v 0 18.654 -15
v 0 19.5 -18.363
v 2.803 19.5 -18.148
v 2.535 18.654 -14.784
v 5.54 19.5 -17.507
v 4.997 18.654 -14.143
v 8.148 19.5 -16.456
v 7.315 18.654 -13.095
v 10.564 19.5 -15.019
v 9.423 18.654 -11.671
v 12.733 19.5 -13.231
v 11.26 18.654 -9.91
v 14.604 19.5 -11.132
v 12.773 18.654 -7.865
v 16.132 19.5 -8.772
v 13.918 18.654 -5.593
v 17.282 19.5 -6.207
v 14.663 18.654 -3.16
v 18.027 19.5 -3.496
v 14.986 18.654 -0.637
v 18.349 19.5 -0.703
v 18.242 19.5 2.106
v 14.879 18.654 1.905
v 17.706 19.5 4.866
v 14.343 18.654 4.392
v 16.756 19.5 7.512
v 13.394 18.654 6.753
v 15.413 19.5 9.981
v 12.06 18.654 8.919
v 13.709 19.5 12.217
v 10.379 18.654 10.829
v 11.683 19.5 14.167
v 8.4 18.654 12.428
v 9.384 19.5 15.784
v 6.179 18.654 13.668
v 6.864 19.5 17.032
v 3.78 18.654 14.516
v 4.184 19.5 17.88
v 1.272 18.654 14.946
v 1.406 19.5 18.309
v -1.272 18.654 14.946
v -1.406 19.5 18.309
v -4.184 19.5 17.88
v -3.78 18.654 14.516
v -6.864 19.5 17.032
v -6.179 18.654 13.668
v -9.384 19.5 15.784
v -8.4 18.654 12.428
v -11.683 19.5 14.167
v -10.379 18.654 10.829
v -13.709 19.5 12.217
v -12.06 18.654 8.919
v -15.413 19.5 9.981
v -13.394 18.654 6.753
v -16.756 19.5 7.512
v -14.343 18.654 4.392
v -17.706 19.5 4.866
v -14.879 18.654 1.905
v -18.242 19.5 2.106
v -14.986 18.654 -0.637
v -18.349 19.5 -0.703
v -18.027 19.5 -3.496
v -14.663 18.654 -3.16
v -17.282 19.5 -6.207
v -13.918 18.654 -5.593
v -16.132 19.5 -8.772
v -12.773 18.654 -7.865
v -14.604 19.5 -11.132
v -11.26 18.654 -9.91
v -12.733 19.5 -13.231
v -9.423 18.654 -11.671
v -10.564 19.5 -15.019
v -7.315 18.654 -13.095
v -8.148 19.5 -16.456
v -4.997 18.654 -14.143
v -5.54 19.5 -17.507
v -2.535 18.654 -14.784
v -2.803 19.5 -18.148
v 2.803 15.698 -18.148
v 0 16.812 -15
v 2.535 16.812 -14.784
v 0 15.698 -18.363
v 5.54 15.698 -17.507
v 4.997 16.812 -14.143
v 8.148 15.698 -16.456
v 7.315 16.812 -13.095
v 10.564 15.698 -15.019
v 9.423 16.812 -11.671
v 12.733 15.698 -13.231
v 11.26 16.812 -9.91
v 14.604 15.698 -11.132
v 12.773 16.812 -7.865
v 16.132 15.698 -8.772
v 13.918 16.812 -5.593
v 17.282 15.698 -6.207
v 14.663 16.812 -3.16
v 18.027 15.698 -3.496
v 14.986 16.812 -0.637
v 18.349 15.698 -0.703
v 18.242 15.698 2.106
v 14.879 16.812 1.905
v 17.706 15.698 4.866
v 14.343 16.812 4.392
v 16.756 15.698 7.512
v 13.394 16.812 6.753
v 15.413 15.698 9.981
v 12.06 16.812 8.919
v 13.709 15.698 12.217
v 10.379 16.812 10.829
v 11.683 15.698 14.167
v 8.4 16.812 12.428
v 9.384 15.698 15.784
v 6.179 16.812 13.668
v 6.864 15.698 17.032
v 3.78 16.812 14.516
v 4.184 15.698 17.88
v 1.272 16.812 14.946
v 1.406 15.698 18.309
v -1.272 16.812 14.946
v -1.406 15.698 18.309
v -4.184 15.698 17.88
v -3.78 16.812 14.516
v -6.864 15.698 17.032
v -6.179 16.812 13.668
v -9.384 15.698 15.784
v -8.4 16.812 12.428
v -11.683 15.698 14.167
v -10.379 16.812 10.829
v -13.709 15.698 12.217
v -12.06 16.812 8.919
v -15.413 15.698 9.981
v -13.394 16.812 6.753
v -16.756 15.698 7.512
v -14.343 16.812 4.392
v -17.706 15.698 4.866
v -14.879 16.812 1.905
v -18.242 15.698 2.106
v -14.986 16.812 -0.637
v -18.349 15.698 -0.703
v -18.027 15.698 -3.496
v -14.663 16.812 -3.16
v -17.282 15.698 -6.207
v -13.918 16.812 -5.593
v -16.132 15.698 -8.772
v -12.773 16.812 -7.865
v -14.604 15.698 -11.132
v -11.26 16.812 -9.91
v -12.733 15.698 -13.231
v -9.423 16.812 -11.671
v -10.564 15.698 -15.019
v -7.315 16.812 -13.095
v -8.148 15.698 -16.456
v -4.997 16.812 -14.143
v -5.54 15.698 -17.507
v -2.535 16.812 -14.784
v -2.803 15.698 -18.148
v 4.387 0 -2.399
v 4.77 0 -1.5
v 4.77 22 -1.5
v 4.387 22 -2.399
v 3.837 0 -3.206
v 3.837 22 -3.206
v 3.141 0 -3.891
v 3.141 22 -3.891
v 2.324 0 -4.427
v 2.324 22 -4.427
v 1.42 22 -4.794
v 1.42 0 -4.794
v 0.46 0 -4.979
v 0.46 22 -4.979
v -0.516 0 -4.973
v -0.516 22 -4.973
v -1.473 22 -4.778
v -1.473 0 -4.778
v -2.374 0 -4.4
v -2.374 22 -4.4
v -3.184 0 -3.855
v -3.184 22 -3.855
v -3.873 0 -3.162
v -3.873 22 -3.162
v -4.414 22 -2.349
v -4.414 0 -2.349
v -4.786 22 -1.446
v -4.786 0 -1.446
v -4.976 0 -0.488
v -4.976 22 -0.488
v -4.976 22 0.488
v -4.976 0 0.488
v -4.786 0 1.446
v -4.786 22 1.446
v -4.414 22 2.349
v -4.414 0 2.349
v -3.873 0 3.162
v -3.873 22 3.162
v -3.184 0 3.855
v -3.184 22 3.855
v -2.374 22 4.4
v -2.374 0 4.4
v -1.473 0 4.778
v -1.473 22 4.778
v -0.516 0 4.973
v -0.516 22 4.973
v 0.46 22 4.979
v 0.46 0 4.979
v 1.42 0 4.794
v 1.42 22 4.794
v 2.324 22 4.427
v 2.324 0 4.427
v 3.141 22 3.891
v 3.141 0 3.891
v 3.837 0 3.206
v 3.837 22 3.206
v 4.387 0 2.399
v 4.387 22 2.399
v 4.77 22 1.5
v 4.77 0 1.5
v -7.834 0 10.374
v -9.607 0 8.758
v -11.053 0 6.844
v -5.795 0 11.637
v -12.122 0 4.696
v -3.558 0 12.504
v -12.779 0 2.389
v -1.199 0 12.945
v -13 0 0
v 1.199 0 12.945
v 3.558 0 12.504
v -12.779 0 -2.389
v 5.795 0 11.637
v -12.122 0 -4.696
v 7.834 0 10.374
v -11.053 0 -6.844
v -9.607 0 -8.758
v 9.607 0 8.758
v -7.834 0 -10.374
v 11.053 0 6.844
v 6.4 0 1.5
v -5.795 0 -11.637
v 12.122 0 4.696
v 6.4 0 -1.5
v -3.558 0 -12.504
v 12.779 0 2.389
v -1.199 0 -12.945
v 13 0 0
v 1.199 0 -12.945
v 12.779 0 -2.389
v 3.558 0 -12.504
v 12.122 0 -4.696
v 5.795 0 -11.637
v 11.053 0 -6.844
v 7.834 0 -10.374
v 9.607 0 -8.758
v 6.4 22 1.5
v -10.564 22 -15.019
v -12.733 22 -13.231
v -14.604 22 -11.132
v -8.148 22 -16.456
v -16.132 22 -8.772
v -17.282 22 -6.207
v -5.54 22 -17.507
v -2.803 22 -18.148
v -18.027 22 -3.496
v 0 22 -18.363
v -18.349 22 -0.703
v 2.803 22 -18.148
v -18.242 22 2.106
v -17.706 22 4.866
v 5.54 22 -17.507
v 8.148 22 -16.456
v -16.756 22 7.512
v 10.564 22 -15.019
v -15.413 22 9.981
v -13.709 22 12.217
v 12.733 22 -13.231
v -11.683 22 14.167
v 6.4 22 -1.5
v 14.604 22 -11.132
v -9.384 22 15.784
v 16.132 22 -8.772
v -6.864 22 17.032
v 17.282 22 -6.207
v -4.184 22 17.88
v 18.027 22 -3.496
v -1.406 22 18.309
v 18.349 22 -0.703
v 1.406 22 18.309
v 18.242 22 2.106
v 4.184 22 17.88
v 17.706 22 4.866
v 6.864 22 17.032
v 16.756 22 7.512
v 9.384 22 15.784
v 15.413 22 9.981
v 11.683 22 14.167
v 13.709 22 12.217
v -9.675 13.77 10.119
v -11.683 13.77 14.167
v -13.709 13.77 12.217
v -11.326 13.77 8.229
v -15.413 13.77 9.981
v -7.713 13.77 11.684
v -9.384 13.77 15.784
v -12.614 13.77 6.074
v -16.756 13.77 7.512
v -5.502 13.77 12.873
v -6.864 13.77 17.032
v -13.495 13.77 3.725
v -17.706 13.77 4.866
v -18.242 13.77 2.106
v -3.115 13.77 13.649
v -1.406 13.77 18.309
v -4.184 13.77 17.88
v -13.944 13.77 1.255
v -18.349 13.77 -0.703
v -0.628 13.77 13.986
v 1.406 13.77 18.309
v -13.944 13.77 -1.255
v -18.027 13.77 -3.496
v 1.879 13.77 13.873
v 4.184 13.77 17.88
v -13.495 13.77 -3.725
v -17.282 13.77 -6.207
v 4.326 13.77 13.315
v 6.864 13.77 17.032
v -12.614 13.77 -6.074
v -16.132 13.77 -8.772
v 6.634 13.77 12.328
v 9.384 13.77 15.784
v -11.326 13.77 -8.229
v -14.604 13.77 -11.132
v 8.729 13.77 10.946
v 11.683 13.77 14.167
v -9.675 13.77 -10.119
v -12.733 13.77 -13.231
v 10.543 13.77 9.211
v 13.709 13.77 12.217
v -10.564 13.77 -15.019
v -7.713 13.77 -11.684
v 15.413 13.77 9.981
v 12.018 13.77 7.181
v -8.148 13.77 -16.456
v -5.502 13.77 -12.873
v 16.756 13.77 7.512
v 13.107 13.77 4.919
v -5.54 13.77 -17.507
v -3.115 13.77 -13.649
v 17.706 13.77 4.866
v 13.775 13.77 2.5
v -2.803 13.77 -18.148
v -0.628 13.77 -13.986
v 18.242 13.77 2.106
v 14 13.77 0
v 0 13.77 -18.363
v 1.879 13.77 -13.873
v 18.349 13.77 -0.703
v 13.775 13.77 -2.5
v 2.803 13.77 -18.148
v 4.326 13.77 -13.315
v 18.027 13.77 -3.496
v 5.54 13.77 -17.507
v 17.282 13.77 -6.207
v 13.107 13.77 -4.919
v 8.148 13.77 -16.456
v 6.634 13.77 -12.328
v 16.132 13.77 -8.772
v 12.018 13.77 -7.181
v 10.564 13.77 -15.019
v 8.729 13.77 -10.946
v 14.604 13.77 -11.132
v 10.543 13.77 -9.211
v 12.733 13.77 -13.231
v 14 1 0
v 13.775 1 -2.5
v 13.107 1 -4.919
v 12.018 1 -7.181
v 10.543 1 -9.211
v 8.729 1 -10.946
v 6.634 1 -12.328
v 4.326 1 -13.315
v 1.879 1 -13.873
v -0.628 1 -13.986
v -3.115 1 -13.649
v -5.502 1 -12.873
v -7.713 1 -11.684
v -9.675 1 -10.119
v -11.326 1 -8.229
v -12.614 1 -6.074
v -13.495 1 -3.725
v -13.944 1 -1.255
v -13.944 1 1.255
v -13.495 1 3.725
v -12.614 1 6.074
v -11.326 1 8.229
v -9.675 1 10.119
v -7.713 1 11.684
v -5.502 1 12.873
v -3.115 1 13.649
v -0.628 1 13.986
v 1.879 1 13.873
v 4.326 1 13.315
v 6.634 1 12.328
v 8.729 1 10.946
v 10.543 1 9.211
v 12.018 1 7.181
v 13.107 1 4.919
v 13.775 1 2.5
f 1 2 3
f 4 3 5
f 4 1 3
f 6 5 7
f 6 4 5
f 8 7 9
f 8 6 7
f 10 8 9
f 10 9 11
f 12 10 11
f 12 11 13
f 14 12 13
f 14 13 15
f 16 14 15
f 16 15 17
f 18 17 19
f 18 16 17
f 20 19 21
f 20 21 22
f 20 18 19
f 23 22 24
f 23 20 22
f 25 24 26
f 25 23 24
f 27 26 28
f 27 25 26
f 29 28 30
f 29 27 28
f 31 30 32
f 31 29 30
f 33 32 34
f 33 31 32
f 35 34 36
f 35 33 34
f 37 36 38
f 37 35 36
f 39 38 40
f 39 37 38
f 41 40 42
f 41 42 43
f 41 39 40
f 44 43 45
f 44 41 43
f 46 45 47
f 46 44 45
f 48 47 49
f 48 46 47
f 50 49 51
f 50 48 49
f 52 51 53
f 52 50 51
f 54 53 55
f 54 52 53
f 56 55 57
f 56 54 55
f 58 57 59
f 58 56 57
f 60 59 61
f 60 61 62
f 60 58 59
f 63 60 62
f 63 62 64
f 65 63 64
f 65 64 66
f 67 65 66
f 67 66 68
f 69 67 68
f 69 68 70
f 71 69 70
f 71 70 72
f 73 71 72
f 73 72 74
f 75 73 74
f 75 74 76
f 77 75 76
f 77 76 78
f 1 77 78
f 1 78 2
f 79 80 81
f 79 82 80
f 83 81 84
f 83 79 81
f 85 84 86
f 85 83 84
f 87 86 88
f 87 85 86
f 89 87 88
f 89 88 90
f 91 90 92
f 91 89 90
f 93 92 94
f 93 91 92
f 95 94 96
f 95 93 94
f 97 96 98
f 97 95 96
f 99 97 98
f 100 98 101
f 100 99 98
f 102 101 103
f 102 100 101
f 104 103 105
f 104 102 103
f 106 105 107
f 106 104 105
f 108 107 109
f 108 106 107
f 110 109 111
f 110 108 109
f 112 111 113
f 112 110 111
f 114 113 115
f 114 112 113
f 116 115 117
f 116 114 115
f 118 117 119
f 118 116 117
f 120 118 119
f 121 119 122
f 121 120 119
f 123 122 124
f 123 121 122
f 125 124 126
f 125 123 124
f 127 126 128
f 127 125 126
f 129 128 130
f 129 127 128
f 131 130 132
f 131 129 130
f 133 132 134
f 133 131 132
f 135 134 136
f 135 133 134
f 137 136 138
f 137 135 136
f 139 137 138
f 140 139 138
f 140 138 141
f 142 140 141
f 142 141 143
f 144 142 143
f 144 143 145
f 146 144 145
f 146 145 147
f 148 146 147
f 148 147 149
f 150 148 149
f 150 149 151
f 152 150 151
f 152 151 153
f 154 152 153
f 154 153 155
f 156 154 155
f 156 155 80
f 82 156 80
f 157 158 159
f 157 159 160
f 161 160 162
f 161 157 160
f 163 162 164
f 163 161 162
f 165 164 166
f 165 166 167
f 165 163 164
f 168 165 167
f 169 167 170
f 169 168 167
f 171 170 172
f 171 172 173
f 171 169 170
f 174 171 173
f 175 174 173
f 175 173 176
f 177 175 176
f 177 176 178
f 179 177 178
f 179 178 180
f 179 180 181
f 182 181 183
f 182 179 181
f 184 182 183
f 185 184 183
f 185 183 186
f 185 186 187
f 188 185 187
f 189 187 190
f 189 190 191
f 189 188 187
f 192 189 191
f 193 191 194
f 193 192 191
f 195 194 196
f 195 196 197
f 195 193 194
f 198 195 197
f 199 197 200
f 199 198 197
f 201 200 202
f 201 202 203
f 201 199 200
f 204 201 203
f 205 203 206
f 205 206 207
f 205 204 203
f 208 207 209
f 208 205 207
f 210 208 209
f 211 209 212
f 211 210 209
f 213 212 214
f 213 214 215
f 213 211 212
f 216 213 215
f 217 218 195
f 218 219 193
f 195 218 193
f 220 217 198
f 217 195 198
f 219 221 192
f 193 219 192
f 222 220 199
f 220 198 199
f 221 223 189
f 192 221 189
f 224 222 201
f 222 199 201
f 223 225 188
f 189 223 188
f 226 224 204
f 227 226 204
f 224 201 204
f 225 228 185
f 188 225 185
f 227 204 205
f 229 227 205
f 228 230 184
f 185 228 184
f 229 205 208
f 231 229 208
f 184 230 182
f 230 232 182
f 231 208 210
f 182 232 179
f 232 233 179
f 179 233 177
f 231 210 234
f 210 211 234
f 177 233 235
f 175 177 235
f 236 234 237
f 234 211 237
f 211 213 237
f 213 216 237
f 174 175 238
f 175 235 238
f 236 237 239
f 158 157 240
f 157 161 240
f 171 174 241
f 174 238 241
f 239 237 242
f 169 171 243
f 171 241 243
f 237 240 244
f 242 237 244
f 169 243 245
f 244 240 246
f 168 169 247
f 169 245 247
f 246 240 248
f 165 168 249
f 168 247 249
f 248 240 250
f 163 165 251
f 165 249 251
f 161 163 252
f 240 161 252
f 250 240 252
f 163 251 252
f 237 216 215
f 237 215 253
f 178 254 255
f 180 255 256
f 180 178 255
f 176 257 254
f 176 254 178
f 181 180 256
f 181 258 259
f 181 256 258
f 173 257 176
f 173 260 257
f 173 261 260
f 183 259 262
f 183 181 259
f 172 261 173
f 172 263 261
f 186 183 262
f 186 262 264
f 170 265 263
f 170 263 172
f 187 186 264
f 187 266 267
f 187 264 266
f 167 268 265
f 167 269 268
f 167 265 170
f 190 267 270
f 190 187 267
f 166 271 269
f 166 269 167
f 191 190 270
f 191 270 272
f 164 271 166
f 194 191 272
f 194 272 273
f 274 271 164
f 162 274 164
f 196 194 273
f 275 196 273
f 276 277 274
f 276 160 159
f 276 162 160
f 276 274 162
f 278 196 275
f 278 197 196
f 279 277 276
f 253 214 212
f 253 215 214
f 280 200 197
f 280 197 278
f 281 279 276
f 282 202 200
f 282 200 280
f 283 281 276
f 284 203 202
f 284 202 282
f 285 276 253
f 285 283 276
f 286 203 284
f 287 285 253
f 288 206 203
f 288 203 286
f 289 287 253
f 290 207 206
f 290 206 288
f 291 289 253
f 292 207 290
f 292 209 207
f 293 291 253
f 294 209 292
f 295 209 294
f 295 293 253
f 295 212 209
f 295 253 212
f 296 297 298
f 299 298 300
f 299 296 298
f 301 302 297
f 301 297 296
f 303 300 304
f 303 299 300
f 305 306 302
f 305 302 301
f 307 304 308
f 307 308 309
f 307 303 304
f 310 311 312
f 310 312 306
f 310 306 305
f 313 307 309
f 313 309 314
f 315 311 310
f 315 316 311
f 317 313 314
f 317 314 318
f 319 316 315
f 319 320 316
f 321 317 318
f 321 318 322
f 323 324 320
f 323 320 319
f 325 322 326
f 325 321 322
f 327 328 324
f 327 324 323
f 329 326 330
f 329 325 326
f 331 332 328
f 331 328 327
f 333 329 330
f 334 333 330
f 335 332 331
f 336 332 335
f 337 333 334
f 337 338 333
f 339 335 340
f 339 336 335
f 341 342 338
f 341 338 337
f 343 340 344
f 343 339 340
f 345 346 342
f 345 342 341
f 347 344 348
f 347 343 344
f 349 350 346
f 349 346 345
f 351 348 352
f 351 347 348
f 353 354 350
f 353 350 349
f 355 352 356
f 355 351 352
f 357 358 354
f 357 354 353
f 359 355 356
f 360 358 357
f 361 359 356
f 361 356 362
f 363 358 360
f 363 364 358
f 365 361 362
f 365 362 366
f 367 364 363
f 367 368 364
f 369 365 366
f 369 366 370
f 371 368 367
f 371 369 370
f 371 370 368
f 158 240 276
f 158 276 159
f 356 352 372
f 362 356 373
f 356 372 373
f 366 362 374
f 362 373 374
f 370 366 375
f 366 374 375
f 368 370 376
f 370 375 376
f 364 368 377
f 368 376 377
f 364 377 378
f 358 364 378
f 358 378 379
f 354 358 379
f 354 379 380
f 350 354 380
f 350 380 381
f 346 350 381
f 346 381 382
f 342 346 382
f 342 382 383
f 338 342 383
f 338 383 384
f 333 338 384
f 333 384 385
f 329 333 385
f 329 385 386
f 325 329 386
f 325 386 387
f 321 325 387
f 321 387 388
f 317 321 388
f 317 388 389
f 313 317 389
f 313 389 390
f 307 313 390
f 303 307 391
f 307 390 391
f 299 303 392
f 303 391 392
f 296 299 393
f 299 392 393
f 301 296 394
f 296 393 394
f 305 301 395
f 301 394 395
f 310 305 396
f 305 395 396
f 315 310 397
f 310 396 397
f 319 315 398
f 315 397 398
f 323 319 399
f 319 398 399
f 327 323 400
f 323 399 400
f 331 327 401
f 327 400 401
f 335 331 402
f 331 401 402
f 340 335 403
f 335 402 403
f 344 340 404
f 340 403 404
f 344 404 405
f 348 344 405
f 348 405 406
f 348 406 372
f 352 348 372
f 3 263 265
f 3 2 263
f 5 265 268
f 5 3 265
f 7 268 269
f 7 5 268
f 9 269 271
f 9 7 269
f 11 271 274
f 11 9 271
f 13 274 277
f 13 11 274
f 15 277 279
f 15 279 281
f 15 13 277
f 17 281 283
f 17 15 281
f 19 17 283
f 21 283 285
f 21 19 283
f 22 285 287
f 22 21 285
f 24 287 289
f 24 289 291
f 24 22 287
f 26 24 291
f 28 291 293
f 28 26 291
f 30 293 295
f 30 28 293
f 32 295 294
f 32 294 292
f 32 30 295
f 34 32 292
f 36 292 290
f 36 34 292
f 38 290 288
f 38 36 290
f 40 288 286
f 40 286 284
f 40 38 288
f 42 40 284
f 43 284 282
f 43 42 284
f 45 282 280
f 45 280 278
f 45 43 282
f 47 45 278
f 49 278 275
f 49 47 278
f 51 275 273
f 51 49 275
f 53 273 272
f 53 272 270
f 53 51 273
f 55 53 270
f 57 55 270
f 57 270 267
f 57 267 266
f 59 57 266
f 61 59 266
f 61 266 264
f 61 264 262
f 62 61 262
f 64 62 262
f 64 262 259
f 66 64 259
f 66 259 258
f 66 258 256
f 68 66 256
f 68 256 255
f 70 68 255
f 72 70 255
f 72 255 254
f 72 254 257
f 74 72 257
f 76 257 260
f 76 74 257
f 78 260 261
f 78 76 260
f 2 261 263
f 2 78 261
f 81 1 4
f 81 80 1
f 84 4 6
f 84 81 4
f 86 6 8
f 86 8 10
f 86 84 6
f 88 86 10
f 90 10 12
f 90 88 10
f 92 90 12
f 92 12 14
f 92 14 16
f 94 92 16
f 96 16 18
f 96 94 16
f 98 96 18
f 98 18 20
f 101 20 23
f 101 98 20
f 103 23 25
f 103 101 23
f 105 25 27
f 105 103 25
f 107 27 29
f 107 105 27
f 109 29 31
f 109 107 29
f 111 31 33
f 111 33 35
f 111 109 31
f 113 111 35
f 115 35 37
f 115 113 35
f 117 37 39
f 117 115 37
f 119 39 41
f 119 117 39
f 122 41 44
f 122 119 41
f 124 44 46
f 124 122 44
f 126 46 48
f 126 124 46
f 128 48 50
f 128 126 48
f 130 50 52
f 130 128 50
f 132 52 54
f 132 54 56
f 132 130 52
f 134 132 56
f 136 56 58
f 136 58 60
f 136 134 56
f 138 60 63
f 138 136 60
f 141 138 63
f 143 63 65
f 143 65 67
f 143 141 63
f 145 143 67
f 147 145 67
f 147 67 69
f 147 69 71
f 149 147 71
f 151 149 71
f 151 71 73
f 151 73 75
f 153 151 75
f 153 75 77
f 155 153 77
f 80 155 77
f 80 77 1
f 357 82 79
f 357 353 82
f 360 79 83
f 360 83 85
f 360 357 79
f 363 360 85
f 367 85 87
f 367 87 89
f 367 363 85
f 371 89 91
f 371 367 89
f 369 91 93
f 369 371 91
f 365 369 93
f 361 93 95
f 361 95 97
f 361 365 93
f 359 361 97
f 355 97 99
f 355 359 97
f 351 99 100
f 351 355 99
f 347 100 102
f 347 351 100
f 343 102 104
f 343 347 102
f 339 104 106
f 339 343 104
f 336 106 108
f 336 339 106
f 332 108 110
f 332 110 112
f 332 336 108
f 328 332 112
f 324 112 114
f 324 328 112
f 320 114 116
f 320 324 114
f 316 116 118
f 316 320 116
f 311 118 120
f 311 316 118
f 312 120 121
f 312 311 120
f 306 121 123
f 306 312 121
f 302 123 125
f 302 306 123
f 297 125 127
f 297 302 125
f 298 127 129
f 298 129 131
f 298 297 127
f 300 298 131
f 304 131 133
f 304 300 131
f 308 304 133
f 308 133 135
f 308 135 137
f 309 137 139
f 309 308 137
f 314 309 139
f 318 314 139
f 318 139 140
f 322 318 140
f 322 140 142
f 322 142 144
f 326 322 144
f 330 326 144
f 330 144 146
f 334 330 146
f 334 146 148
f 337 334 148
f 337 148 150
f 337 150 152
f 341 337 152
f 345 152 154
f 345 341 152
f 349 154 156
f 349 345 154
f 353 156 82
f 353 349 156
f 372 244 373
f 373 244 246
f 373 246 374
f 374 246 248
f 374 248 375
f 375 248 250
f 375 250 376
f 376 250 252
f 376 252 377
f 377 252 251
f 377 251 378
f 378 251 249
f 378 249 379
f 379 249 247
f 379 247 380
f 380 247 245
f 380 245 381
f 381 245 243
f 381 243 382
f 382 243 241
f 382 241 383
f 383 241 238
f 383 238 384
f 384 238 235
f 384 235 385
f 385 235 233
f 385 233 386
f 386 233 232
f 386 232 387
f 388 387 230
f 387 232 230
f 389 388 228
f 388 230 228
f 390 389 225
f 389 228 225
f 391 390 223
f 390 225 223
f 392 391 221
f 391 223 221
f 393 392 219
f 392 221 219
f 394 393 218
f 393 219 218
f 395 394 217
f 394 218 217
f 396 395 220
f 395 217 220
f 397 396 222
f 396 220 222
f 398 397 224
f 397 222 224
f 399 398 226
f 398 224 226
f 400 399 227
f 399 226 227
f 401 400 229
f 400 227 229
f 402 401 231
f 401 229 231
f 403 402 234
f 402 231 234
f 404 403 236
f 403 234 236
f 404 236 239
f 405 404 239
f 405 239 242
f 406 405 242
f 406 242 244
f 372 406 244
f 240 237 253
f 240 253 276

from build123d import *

# Parameters (mm, degrees)
SKETCH1_R           = 14
BOSS_EXTRUDE2_DEPTH = 22
CHAMFER1_SIZE       = 1


with BuildPart() as part:
    # Sketch1 → Boss-Extrude2 (new body)
    with BuildSketch(Plane(origin=(0, 0, 0), x_dir=(1, 0, 0), z_dir=(0, 1, 0))):
        Circle(SKETCH1_R)
        with BuildLine():
            Line((4.769696007, -1.5), (6.4, -1.5))
            Line((6.4, -1.5), (6.4, 1.5))
            Line((6.4, 1.5), (4.769696007, 1.5))
            ThreePointArc((4.769696007, 1.5), (-5, 0), (4.769696007, -1.5))
        make_face(mode=Mode.SUBTRACT)
    extrude(amount=BOSS_EXTRUDE2_DEPTH)

    # Chamfer1
    chamfer1_edges = [part.edges().sort_by_distance(p)[0] for p in [
        (-14, 0, 0),
    ]]
    chamfer(chamfer1_edges, length=CHAMFER1_SIZE)

    # Sketch2 → Revolve1 (revolve)
    with BuildSketch(Plane(origin=(0, 0, 0), x_dir=(0, 0, -1), z_dir=(1, 0, 0))):
        Polygon((14, 22), (18.362757193, 22), (18.362757193, 19.5), (15, 18.654420503), (15, 16.811960425), (18.362757193, 15.697914797), (18.362757193, 13.769758902), (14, 13.769758902), align=None)
    revolve(axis=Axis((0, 22, 0), (0, -1, 0)))


solid = part.part
